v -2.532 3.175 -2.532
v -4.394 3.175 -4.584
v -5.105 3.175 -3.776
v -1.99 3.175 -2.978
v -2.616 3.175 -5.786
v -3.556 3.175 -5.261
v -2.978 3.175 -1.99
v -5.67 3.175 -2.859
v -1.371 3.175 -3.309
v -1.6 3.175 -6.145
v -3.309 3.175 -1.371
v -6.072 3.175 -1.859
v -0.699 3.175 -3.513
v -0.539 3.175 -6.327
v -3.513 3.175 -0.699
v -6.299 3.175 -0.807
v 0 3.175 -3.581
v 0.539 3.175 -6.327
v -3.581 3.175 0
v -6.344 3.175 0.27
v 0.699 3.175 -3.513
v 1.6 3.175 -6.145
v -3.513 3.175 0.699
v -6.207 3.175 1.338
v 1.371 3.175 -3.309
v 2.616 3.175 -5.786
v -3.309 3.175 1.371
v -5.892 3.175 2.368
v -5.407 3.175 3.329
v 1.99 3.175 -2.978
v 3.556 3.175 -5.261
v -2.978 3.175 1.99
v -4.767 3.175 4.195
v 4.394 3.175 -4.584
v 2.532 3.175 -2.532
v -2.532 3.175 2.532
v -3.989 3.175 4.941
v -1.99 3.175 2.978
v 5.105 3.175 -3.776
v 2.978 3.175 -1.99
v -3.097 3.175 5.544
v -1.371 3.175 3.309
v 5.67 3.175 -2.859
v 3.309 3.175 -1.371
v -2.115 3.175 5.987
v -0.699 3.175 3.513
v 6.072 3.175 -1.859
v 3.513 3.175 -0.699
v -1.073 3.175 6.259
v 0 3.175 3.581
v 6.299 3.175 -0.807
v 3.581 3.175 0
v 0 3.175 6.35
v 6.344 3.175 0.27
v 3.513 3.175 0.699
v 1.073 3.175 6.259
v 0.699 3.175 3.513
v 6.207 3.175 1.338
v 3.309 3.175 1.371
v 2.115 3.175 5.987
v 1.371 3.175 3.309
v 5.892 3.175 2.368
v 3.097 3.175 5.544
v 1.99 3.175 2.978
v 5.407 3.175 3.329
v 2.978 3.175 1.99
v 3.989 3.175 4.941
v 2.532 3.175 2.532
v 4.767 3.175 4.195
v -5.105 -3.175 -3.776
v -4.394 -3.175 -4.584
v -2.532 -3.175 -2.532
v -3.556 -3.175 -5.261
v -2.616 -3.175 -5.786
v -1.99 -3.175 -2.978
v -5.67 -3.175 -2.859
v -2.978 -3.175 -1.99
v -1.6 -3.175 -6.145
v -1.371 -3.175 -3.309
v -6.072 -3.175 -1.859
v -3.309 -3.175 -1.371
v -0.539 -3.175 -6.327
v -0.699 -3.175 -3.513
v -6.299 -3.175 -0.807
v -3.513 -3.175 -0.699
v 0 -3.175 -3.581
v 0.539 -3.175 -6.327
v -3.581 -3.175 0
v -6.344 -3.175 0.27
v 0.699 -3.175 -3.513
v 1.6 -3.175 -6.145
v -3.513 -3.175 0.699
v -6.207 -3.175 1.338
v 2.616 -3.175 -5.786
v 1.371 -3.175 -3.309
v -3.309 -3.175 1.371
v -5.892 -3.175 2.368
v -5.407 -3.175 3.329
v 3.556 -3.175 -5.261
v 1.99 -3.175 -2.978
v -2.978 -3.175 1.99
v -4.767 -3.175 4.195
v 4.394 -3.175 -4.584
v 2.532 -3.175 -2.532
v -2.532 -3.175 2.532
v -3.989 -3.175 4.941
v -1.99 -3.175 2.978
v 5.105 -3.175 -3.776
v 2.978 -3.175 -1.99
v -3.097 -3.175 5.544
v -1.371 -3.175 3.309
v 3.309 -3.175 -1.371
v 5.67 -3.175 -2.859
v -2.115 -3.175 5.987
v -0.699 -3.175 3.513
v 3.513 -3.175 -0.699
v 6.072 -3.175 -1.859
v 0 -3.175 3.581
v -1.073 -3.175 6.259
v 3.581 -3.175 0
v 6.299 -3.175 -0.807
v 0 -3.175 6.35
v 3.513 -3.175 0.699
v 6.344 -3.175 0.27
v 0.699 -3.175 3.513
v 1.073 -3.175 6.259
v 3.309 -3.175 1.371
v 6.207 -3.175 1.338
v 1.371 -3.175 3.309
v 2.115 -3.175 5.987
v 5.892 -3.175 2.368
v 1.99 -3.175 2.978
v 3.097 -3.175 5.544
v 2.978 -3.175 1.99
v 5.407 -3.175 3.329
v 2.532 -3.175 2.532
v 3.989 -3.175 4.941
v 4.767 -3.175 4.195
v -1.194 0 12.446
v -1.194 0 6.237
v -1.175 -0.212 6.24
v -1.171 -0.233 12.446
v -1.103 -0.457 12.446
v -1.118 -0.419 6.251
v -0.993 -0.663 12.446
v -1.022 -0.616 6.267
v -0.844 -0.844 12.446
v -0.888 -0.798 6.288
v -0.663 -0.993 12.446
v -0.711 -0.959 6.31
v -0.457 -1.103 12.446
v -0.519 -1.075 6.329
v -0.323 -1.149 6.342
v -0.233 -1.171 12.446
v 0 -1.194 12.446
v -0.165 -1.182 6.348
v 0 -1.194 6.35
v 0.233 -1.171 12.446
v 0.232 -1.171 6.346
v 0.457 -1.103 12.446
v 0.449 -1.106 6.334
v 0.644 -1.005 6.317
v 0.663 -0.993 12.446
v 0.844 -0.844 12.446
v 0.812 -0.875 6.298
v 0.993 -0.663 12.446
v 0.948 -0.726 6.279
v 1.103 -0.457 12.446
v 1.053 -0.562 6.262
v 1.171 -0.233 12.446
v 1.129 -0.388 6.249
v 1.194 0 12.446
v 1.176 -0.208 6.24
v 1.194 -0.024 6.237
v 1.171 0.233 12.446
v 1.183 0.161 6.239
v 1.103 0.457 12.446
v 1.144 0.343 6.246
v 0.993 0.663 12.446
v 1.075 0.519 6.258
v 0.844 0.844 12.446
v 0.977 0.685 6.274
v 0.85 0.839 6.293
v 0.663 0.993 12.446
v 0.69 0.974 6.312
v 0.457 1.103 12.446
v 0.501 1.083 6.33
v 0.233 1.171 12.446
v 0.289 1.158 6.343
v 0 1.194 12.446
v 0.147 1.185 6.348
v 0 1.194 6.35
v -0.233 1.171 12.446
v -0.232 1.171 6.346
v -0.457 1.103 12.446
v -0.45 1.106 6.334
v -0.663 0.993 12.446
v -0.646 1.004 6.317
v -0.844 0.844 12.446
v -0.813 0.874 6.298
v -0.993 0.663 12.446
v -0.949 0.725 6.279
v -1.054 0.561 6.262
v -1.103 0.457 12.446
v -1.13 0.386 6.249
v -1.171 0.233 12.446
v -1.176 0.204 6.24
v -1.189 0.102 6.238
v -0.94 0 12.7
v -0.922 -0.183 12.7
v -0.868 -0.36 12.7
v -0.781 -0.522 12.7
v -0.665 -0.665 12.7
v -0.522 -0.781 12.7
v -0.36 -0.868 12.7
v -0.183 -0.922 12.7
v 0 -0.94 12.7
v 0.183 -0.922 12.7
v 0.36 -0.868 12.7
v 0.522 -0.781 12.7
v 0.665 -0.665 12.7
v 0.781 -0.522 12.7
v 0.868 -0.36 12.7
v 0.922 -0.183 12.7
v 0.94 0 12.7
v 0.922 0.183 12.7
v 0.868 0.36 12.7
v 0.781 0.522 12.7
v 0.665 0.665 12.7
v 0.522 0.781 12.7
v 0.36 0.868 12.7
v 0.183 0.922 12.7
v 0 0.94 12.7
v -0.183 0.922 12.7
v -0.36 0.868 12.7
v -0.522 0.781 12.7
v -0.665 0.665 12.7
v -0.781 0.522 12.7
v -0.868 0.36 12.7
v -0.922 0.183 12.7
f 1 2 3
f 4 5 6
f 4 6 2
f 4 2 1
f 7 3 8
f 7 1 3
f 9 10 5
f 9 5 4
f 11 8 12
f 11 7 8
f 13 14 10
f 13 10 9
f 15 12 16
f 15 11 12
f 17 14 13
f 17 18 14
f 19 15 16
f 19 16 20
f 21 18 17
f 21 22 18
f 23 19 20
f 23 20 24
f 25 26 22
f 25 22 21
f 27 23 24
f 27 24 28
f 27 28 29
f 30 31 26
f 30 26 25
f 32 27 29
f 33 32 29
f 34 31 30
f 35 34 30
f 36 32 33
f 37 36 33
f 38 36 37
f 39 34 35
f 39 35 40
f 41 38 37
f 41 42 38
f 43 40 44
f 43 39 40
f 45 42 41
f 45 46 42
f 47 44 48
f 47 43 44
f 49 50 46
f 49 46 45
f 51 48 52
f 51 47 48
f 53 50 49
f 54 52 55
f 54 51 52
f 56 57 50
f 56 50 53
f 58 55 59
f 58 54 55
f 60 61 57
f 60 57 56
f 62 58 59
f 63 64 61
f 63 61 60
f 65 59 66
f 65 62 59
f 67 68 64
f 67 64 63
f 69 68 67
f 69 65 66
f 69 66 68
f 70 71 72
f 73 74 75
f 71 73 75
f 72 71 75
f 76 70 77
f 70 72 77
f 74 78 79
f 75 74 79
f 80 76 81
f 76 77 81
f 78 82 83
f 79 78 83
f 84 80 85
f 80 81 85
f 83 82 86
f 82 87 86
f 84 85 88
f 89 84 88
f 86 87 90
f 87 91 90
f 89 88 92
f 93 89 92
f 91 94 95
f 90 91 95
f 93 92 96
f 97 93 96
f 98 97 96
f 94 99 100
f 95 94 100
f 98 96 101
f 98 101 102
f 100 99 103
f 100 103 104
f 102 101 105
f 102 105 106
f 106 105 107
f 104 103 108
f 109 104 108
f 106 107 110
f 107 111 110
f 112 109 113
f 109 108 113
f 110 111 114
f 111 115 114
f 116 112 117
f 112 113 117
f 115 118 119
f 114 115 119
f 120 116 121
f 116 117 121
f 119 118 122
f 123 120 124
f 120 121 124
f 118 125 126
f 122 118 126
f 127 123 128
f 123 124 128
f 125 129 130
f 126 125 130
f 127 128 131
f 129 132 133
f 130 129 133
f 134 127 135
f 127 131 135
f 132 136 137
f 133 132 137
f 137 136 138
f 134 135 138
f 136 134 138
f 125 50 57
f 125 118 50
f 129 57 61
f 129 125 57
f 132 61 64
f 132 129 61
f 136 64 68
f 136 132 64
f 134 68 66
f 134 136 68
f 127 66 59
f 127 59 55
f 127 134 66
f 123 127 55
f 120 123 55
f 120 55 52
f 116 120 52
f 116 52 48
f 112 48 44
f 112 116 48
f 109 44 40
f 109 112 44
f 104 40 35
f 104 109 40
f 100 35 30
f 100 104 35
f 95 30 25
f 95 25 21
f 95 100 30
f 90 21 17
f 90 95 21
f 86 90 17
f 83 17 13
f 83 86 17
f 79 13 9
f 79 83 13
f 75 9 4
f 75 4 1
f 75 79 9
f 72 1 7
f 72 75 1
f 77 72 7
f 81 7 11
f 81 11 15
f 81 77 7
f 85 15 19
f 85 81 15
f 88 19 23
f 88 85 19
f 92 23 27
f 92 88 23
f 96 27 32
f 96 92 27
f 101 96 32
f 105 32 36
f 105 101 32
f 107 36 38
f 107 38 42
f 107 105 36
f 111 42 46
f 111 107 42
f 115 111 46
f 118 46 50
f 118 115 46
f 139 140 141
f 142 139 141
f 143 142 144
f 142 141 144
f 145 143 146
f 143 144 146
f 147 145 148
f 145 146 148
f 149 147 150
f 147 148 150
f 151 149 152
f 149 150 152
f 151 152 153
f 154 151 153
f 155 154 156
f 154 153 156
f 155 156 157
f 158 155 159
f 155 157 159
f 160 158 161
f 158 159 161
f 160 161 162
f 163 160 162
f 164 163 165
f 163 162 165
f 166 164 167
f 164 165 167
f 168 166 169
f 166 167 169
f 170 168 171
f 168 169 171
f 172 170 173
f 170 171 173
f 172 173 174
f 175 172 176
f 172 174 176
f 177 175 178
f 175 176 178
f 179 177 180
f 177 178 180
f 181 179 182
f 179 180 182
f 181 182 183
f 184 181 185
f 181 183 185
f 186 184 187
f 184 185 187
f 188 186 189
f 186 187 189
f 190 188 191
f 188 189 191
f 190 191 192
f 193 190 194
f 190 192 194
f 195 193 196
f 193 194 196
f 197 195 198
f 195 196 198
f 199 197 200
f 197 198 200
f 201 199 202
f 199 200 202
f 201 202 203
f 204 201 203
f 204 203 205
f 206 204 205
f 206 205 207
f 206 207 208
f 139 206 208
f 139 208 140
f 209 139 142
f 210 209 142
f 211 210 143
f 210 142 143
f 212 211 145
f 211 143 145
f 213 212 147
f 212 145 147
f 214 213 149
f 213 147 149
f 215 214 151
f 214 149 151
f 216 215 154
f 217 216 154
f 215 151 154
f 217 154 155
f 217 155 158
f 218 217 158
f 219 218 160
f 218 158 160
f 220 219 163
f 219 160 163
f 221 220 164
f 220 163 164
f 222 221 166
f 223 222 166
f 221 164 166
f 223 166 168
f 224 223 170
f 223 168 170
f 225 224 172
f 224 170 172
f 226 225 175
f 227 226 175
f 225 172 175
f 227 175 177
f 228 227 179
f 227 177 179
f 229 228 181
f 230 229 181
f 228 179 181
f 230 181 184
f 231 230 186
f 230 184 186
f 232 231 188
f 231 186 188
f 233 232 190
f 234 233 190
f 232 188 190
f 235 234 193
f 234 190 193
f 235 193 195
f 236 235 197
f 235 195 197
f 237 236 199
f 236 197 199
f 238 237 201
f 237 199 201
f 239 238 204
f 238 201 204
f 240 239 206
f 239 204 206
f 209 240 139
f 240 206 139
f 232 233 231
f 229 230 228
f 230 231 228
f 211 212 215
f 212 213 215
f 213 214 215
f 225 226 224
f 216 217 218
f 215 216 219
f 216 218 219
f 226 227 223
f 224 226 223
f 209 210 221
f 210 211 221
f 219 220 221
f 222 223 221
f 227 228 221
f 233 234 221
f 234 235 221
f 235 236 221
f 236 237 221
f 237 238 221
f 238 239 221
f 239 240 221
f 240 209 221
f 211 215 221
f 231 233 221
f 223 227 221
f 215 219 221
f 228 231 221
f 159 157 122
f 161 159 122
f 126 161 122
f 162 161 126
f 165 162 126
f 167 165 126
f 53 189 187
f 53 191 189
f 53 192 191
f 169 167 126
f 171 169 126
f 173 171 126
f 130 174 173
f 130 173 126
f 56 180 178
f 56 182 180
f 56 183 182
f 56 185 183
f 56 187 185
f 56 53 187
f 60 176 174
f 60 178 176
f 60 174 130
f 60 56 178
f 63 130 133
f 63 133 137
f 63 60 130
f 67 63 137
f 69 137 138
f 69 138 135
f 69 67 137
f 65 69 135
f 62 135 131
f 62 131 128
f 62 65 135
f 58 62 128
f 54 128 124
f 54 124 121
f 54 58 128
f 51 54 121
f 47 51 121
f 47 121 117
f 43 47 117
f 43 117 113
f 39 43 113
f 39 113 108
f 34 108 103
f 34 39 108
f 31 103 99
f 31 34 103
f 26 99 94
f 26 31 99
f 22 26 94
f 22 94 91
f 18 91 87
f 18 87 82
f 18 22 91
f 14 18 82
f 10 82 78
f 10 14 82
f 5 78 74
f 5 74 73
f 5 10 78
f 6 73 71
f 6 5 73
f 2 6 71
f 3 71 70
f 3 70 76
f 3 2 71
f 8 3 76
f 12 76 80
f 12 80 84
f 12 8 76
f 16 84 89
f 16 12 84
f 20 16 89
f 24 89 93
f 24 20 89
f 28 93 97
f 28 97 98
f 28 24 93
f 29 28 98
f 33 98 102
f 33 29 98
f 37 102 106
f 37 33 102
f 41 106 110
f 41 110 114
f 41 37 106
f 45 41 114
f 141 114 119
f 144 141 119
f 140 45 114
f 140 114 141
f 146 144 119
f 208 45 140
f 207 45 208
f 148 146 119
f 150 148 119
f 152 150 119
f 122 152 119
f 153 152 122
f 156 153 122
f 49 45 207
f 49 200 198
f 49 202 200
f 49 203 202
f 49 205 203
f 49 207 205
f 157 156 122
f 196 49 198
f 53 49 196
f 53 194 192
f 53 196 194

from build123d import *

# Parameters (mm, degrees)
SKETCH1_R           = 6.35
SKETCH1_R_2         = 3.5814
EXTRUDE1_DEPTH      = 3.175
EXTRUDE1_DEPTH_BACK = 3.175
SKETCH4_W           = 1.1938
SKETCH4_H           = 7.9248
CHAMFER1_SIZE       = 0.254


with BuildPart() as part:
    # Sketch1 → Extrude1 (new, two sides)
    with BuildSketch(Plane(origin=(0, 0, 0), x_dir=(1, 0, 0), z_dir=(0, 1, 0))) as extrude1_sk:
        with Locations(Location((0, 0, 0), (0, 0, 270))):
            Circle(SKETCH1_R)
        with Locations(Location((0, 0, 0), (0, 0, 270))):
            Circle(SKETCH1_R_2, mode=Mode.SUBTRACT)
    extrude(amount=EXTRUDE1_DEPTH)
    extrude(extrude1_sk.sketch, amount=-EXTRUDE1_DEPTH_BACK)

    # Sketch4 → Revolve1 (revolve)
    with BuildSketch(Plane(origin=(0, 0, 0), x_dir=(1, 0, 0), z_dir=(0, 1, 0)), mode=Mode.PRIVATE) as revolve1_sk:
        with Locations((0.5969, -8.7376)):
            Rectangle(SKETCH4_W, SKETCH4_H)
    revolve(revolve1_sk.sketch.rotate(Axis((0, 0, 4.7752), (0, 0, 1)), 180), axis=Axis((0, 0, 4.7752), (0, 0, 1)))

    # Chamfer1
    chamfer1_edges = [part.edges().sort_by_distance(p)[0] for p in [
        (1.1938, 0, 12.7),
    ]]
    chamfer(chamfer1_edges, length=CHAMFER1_SIZE)


solid = part.part
